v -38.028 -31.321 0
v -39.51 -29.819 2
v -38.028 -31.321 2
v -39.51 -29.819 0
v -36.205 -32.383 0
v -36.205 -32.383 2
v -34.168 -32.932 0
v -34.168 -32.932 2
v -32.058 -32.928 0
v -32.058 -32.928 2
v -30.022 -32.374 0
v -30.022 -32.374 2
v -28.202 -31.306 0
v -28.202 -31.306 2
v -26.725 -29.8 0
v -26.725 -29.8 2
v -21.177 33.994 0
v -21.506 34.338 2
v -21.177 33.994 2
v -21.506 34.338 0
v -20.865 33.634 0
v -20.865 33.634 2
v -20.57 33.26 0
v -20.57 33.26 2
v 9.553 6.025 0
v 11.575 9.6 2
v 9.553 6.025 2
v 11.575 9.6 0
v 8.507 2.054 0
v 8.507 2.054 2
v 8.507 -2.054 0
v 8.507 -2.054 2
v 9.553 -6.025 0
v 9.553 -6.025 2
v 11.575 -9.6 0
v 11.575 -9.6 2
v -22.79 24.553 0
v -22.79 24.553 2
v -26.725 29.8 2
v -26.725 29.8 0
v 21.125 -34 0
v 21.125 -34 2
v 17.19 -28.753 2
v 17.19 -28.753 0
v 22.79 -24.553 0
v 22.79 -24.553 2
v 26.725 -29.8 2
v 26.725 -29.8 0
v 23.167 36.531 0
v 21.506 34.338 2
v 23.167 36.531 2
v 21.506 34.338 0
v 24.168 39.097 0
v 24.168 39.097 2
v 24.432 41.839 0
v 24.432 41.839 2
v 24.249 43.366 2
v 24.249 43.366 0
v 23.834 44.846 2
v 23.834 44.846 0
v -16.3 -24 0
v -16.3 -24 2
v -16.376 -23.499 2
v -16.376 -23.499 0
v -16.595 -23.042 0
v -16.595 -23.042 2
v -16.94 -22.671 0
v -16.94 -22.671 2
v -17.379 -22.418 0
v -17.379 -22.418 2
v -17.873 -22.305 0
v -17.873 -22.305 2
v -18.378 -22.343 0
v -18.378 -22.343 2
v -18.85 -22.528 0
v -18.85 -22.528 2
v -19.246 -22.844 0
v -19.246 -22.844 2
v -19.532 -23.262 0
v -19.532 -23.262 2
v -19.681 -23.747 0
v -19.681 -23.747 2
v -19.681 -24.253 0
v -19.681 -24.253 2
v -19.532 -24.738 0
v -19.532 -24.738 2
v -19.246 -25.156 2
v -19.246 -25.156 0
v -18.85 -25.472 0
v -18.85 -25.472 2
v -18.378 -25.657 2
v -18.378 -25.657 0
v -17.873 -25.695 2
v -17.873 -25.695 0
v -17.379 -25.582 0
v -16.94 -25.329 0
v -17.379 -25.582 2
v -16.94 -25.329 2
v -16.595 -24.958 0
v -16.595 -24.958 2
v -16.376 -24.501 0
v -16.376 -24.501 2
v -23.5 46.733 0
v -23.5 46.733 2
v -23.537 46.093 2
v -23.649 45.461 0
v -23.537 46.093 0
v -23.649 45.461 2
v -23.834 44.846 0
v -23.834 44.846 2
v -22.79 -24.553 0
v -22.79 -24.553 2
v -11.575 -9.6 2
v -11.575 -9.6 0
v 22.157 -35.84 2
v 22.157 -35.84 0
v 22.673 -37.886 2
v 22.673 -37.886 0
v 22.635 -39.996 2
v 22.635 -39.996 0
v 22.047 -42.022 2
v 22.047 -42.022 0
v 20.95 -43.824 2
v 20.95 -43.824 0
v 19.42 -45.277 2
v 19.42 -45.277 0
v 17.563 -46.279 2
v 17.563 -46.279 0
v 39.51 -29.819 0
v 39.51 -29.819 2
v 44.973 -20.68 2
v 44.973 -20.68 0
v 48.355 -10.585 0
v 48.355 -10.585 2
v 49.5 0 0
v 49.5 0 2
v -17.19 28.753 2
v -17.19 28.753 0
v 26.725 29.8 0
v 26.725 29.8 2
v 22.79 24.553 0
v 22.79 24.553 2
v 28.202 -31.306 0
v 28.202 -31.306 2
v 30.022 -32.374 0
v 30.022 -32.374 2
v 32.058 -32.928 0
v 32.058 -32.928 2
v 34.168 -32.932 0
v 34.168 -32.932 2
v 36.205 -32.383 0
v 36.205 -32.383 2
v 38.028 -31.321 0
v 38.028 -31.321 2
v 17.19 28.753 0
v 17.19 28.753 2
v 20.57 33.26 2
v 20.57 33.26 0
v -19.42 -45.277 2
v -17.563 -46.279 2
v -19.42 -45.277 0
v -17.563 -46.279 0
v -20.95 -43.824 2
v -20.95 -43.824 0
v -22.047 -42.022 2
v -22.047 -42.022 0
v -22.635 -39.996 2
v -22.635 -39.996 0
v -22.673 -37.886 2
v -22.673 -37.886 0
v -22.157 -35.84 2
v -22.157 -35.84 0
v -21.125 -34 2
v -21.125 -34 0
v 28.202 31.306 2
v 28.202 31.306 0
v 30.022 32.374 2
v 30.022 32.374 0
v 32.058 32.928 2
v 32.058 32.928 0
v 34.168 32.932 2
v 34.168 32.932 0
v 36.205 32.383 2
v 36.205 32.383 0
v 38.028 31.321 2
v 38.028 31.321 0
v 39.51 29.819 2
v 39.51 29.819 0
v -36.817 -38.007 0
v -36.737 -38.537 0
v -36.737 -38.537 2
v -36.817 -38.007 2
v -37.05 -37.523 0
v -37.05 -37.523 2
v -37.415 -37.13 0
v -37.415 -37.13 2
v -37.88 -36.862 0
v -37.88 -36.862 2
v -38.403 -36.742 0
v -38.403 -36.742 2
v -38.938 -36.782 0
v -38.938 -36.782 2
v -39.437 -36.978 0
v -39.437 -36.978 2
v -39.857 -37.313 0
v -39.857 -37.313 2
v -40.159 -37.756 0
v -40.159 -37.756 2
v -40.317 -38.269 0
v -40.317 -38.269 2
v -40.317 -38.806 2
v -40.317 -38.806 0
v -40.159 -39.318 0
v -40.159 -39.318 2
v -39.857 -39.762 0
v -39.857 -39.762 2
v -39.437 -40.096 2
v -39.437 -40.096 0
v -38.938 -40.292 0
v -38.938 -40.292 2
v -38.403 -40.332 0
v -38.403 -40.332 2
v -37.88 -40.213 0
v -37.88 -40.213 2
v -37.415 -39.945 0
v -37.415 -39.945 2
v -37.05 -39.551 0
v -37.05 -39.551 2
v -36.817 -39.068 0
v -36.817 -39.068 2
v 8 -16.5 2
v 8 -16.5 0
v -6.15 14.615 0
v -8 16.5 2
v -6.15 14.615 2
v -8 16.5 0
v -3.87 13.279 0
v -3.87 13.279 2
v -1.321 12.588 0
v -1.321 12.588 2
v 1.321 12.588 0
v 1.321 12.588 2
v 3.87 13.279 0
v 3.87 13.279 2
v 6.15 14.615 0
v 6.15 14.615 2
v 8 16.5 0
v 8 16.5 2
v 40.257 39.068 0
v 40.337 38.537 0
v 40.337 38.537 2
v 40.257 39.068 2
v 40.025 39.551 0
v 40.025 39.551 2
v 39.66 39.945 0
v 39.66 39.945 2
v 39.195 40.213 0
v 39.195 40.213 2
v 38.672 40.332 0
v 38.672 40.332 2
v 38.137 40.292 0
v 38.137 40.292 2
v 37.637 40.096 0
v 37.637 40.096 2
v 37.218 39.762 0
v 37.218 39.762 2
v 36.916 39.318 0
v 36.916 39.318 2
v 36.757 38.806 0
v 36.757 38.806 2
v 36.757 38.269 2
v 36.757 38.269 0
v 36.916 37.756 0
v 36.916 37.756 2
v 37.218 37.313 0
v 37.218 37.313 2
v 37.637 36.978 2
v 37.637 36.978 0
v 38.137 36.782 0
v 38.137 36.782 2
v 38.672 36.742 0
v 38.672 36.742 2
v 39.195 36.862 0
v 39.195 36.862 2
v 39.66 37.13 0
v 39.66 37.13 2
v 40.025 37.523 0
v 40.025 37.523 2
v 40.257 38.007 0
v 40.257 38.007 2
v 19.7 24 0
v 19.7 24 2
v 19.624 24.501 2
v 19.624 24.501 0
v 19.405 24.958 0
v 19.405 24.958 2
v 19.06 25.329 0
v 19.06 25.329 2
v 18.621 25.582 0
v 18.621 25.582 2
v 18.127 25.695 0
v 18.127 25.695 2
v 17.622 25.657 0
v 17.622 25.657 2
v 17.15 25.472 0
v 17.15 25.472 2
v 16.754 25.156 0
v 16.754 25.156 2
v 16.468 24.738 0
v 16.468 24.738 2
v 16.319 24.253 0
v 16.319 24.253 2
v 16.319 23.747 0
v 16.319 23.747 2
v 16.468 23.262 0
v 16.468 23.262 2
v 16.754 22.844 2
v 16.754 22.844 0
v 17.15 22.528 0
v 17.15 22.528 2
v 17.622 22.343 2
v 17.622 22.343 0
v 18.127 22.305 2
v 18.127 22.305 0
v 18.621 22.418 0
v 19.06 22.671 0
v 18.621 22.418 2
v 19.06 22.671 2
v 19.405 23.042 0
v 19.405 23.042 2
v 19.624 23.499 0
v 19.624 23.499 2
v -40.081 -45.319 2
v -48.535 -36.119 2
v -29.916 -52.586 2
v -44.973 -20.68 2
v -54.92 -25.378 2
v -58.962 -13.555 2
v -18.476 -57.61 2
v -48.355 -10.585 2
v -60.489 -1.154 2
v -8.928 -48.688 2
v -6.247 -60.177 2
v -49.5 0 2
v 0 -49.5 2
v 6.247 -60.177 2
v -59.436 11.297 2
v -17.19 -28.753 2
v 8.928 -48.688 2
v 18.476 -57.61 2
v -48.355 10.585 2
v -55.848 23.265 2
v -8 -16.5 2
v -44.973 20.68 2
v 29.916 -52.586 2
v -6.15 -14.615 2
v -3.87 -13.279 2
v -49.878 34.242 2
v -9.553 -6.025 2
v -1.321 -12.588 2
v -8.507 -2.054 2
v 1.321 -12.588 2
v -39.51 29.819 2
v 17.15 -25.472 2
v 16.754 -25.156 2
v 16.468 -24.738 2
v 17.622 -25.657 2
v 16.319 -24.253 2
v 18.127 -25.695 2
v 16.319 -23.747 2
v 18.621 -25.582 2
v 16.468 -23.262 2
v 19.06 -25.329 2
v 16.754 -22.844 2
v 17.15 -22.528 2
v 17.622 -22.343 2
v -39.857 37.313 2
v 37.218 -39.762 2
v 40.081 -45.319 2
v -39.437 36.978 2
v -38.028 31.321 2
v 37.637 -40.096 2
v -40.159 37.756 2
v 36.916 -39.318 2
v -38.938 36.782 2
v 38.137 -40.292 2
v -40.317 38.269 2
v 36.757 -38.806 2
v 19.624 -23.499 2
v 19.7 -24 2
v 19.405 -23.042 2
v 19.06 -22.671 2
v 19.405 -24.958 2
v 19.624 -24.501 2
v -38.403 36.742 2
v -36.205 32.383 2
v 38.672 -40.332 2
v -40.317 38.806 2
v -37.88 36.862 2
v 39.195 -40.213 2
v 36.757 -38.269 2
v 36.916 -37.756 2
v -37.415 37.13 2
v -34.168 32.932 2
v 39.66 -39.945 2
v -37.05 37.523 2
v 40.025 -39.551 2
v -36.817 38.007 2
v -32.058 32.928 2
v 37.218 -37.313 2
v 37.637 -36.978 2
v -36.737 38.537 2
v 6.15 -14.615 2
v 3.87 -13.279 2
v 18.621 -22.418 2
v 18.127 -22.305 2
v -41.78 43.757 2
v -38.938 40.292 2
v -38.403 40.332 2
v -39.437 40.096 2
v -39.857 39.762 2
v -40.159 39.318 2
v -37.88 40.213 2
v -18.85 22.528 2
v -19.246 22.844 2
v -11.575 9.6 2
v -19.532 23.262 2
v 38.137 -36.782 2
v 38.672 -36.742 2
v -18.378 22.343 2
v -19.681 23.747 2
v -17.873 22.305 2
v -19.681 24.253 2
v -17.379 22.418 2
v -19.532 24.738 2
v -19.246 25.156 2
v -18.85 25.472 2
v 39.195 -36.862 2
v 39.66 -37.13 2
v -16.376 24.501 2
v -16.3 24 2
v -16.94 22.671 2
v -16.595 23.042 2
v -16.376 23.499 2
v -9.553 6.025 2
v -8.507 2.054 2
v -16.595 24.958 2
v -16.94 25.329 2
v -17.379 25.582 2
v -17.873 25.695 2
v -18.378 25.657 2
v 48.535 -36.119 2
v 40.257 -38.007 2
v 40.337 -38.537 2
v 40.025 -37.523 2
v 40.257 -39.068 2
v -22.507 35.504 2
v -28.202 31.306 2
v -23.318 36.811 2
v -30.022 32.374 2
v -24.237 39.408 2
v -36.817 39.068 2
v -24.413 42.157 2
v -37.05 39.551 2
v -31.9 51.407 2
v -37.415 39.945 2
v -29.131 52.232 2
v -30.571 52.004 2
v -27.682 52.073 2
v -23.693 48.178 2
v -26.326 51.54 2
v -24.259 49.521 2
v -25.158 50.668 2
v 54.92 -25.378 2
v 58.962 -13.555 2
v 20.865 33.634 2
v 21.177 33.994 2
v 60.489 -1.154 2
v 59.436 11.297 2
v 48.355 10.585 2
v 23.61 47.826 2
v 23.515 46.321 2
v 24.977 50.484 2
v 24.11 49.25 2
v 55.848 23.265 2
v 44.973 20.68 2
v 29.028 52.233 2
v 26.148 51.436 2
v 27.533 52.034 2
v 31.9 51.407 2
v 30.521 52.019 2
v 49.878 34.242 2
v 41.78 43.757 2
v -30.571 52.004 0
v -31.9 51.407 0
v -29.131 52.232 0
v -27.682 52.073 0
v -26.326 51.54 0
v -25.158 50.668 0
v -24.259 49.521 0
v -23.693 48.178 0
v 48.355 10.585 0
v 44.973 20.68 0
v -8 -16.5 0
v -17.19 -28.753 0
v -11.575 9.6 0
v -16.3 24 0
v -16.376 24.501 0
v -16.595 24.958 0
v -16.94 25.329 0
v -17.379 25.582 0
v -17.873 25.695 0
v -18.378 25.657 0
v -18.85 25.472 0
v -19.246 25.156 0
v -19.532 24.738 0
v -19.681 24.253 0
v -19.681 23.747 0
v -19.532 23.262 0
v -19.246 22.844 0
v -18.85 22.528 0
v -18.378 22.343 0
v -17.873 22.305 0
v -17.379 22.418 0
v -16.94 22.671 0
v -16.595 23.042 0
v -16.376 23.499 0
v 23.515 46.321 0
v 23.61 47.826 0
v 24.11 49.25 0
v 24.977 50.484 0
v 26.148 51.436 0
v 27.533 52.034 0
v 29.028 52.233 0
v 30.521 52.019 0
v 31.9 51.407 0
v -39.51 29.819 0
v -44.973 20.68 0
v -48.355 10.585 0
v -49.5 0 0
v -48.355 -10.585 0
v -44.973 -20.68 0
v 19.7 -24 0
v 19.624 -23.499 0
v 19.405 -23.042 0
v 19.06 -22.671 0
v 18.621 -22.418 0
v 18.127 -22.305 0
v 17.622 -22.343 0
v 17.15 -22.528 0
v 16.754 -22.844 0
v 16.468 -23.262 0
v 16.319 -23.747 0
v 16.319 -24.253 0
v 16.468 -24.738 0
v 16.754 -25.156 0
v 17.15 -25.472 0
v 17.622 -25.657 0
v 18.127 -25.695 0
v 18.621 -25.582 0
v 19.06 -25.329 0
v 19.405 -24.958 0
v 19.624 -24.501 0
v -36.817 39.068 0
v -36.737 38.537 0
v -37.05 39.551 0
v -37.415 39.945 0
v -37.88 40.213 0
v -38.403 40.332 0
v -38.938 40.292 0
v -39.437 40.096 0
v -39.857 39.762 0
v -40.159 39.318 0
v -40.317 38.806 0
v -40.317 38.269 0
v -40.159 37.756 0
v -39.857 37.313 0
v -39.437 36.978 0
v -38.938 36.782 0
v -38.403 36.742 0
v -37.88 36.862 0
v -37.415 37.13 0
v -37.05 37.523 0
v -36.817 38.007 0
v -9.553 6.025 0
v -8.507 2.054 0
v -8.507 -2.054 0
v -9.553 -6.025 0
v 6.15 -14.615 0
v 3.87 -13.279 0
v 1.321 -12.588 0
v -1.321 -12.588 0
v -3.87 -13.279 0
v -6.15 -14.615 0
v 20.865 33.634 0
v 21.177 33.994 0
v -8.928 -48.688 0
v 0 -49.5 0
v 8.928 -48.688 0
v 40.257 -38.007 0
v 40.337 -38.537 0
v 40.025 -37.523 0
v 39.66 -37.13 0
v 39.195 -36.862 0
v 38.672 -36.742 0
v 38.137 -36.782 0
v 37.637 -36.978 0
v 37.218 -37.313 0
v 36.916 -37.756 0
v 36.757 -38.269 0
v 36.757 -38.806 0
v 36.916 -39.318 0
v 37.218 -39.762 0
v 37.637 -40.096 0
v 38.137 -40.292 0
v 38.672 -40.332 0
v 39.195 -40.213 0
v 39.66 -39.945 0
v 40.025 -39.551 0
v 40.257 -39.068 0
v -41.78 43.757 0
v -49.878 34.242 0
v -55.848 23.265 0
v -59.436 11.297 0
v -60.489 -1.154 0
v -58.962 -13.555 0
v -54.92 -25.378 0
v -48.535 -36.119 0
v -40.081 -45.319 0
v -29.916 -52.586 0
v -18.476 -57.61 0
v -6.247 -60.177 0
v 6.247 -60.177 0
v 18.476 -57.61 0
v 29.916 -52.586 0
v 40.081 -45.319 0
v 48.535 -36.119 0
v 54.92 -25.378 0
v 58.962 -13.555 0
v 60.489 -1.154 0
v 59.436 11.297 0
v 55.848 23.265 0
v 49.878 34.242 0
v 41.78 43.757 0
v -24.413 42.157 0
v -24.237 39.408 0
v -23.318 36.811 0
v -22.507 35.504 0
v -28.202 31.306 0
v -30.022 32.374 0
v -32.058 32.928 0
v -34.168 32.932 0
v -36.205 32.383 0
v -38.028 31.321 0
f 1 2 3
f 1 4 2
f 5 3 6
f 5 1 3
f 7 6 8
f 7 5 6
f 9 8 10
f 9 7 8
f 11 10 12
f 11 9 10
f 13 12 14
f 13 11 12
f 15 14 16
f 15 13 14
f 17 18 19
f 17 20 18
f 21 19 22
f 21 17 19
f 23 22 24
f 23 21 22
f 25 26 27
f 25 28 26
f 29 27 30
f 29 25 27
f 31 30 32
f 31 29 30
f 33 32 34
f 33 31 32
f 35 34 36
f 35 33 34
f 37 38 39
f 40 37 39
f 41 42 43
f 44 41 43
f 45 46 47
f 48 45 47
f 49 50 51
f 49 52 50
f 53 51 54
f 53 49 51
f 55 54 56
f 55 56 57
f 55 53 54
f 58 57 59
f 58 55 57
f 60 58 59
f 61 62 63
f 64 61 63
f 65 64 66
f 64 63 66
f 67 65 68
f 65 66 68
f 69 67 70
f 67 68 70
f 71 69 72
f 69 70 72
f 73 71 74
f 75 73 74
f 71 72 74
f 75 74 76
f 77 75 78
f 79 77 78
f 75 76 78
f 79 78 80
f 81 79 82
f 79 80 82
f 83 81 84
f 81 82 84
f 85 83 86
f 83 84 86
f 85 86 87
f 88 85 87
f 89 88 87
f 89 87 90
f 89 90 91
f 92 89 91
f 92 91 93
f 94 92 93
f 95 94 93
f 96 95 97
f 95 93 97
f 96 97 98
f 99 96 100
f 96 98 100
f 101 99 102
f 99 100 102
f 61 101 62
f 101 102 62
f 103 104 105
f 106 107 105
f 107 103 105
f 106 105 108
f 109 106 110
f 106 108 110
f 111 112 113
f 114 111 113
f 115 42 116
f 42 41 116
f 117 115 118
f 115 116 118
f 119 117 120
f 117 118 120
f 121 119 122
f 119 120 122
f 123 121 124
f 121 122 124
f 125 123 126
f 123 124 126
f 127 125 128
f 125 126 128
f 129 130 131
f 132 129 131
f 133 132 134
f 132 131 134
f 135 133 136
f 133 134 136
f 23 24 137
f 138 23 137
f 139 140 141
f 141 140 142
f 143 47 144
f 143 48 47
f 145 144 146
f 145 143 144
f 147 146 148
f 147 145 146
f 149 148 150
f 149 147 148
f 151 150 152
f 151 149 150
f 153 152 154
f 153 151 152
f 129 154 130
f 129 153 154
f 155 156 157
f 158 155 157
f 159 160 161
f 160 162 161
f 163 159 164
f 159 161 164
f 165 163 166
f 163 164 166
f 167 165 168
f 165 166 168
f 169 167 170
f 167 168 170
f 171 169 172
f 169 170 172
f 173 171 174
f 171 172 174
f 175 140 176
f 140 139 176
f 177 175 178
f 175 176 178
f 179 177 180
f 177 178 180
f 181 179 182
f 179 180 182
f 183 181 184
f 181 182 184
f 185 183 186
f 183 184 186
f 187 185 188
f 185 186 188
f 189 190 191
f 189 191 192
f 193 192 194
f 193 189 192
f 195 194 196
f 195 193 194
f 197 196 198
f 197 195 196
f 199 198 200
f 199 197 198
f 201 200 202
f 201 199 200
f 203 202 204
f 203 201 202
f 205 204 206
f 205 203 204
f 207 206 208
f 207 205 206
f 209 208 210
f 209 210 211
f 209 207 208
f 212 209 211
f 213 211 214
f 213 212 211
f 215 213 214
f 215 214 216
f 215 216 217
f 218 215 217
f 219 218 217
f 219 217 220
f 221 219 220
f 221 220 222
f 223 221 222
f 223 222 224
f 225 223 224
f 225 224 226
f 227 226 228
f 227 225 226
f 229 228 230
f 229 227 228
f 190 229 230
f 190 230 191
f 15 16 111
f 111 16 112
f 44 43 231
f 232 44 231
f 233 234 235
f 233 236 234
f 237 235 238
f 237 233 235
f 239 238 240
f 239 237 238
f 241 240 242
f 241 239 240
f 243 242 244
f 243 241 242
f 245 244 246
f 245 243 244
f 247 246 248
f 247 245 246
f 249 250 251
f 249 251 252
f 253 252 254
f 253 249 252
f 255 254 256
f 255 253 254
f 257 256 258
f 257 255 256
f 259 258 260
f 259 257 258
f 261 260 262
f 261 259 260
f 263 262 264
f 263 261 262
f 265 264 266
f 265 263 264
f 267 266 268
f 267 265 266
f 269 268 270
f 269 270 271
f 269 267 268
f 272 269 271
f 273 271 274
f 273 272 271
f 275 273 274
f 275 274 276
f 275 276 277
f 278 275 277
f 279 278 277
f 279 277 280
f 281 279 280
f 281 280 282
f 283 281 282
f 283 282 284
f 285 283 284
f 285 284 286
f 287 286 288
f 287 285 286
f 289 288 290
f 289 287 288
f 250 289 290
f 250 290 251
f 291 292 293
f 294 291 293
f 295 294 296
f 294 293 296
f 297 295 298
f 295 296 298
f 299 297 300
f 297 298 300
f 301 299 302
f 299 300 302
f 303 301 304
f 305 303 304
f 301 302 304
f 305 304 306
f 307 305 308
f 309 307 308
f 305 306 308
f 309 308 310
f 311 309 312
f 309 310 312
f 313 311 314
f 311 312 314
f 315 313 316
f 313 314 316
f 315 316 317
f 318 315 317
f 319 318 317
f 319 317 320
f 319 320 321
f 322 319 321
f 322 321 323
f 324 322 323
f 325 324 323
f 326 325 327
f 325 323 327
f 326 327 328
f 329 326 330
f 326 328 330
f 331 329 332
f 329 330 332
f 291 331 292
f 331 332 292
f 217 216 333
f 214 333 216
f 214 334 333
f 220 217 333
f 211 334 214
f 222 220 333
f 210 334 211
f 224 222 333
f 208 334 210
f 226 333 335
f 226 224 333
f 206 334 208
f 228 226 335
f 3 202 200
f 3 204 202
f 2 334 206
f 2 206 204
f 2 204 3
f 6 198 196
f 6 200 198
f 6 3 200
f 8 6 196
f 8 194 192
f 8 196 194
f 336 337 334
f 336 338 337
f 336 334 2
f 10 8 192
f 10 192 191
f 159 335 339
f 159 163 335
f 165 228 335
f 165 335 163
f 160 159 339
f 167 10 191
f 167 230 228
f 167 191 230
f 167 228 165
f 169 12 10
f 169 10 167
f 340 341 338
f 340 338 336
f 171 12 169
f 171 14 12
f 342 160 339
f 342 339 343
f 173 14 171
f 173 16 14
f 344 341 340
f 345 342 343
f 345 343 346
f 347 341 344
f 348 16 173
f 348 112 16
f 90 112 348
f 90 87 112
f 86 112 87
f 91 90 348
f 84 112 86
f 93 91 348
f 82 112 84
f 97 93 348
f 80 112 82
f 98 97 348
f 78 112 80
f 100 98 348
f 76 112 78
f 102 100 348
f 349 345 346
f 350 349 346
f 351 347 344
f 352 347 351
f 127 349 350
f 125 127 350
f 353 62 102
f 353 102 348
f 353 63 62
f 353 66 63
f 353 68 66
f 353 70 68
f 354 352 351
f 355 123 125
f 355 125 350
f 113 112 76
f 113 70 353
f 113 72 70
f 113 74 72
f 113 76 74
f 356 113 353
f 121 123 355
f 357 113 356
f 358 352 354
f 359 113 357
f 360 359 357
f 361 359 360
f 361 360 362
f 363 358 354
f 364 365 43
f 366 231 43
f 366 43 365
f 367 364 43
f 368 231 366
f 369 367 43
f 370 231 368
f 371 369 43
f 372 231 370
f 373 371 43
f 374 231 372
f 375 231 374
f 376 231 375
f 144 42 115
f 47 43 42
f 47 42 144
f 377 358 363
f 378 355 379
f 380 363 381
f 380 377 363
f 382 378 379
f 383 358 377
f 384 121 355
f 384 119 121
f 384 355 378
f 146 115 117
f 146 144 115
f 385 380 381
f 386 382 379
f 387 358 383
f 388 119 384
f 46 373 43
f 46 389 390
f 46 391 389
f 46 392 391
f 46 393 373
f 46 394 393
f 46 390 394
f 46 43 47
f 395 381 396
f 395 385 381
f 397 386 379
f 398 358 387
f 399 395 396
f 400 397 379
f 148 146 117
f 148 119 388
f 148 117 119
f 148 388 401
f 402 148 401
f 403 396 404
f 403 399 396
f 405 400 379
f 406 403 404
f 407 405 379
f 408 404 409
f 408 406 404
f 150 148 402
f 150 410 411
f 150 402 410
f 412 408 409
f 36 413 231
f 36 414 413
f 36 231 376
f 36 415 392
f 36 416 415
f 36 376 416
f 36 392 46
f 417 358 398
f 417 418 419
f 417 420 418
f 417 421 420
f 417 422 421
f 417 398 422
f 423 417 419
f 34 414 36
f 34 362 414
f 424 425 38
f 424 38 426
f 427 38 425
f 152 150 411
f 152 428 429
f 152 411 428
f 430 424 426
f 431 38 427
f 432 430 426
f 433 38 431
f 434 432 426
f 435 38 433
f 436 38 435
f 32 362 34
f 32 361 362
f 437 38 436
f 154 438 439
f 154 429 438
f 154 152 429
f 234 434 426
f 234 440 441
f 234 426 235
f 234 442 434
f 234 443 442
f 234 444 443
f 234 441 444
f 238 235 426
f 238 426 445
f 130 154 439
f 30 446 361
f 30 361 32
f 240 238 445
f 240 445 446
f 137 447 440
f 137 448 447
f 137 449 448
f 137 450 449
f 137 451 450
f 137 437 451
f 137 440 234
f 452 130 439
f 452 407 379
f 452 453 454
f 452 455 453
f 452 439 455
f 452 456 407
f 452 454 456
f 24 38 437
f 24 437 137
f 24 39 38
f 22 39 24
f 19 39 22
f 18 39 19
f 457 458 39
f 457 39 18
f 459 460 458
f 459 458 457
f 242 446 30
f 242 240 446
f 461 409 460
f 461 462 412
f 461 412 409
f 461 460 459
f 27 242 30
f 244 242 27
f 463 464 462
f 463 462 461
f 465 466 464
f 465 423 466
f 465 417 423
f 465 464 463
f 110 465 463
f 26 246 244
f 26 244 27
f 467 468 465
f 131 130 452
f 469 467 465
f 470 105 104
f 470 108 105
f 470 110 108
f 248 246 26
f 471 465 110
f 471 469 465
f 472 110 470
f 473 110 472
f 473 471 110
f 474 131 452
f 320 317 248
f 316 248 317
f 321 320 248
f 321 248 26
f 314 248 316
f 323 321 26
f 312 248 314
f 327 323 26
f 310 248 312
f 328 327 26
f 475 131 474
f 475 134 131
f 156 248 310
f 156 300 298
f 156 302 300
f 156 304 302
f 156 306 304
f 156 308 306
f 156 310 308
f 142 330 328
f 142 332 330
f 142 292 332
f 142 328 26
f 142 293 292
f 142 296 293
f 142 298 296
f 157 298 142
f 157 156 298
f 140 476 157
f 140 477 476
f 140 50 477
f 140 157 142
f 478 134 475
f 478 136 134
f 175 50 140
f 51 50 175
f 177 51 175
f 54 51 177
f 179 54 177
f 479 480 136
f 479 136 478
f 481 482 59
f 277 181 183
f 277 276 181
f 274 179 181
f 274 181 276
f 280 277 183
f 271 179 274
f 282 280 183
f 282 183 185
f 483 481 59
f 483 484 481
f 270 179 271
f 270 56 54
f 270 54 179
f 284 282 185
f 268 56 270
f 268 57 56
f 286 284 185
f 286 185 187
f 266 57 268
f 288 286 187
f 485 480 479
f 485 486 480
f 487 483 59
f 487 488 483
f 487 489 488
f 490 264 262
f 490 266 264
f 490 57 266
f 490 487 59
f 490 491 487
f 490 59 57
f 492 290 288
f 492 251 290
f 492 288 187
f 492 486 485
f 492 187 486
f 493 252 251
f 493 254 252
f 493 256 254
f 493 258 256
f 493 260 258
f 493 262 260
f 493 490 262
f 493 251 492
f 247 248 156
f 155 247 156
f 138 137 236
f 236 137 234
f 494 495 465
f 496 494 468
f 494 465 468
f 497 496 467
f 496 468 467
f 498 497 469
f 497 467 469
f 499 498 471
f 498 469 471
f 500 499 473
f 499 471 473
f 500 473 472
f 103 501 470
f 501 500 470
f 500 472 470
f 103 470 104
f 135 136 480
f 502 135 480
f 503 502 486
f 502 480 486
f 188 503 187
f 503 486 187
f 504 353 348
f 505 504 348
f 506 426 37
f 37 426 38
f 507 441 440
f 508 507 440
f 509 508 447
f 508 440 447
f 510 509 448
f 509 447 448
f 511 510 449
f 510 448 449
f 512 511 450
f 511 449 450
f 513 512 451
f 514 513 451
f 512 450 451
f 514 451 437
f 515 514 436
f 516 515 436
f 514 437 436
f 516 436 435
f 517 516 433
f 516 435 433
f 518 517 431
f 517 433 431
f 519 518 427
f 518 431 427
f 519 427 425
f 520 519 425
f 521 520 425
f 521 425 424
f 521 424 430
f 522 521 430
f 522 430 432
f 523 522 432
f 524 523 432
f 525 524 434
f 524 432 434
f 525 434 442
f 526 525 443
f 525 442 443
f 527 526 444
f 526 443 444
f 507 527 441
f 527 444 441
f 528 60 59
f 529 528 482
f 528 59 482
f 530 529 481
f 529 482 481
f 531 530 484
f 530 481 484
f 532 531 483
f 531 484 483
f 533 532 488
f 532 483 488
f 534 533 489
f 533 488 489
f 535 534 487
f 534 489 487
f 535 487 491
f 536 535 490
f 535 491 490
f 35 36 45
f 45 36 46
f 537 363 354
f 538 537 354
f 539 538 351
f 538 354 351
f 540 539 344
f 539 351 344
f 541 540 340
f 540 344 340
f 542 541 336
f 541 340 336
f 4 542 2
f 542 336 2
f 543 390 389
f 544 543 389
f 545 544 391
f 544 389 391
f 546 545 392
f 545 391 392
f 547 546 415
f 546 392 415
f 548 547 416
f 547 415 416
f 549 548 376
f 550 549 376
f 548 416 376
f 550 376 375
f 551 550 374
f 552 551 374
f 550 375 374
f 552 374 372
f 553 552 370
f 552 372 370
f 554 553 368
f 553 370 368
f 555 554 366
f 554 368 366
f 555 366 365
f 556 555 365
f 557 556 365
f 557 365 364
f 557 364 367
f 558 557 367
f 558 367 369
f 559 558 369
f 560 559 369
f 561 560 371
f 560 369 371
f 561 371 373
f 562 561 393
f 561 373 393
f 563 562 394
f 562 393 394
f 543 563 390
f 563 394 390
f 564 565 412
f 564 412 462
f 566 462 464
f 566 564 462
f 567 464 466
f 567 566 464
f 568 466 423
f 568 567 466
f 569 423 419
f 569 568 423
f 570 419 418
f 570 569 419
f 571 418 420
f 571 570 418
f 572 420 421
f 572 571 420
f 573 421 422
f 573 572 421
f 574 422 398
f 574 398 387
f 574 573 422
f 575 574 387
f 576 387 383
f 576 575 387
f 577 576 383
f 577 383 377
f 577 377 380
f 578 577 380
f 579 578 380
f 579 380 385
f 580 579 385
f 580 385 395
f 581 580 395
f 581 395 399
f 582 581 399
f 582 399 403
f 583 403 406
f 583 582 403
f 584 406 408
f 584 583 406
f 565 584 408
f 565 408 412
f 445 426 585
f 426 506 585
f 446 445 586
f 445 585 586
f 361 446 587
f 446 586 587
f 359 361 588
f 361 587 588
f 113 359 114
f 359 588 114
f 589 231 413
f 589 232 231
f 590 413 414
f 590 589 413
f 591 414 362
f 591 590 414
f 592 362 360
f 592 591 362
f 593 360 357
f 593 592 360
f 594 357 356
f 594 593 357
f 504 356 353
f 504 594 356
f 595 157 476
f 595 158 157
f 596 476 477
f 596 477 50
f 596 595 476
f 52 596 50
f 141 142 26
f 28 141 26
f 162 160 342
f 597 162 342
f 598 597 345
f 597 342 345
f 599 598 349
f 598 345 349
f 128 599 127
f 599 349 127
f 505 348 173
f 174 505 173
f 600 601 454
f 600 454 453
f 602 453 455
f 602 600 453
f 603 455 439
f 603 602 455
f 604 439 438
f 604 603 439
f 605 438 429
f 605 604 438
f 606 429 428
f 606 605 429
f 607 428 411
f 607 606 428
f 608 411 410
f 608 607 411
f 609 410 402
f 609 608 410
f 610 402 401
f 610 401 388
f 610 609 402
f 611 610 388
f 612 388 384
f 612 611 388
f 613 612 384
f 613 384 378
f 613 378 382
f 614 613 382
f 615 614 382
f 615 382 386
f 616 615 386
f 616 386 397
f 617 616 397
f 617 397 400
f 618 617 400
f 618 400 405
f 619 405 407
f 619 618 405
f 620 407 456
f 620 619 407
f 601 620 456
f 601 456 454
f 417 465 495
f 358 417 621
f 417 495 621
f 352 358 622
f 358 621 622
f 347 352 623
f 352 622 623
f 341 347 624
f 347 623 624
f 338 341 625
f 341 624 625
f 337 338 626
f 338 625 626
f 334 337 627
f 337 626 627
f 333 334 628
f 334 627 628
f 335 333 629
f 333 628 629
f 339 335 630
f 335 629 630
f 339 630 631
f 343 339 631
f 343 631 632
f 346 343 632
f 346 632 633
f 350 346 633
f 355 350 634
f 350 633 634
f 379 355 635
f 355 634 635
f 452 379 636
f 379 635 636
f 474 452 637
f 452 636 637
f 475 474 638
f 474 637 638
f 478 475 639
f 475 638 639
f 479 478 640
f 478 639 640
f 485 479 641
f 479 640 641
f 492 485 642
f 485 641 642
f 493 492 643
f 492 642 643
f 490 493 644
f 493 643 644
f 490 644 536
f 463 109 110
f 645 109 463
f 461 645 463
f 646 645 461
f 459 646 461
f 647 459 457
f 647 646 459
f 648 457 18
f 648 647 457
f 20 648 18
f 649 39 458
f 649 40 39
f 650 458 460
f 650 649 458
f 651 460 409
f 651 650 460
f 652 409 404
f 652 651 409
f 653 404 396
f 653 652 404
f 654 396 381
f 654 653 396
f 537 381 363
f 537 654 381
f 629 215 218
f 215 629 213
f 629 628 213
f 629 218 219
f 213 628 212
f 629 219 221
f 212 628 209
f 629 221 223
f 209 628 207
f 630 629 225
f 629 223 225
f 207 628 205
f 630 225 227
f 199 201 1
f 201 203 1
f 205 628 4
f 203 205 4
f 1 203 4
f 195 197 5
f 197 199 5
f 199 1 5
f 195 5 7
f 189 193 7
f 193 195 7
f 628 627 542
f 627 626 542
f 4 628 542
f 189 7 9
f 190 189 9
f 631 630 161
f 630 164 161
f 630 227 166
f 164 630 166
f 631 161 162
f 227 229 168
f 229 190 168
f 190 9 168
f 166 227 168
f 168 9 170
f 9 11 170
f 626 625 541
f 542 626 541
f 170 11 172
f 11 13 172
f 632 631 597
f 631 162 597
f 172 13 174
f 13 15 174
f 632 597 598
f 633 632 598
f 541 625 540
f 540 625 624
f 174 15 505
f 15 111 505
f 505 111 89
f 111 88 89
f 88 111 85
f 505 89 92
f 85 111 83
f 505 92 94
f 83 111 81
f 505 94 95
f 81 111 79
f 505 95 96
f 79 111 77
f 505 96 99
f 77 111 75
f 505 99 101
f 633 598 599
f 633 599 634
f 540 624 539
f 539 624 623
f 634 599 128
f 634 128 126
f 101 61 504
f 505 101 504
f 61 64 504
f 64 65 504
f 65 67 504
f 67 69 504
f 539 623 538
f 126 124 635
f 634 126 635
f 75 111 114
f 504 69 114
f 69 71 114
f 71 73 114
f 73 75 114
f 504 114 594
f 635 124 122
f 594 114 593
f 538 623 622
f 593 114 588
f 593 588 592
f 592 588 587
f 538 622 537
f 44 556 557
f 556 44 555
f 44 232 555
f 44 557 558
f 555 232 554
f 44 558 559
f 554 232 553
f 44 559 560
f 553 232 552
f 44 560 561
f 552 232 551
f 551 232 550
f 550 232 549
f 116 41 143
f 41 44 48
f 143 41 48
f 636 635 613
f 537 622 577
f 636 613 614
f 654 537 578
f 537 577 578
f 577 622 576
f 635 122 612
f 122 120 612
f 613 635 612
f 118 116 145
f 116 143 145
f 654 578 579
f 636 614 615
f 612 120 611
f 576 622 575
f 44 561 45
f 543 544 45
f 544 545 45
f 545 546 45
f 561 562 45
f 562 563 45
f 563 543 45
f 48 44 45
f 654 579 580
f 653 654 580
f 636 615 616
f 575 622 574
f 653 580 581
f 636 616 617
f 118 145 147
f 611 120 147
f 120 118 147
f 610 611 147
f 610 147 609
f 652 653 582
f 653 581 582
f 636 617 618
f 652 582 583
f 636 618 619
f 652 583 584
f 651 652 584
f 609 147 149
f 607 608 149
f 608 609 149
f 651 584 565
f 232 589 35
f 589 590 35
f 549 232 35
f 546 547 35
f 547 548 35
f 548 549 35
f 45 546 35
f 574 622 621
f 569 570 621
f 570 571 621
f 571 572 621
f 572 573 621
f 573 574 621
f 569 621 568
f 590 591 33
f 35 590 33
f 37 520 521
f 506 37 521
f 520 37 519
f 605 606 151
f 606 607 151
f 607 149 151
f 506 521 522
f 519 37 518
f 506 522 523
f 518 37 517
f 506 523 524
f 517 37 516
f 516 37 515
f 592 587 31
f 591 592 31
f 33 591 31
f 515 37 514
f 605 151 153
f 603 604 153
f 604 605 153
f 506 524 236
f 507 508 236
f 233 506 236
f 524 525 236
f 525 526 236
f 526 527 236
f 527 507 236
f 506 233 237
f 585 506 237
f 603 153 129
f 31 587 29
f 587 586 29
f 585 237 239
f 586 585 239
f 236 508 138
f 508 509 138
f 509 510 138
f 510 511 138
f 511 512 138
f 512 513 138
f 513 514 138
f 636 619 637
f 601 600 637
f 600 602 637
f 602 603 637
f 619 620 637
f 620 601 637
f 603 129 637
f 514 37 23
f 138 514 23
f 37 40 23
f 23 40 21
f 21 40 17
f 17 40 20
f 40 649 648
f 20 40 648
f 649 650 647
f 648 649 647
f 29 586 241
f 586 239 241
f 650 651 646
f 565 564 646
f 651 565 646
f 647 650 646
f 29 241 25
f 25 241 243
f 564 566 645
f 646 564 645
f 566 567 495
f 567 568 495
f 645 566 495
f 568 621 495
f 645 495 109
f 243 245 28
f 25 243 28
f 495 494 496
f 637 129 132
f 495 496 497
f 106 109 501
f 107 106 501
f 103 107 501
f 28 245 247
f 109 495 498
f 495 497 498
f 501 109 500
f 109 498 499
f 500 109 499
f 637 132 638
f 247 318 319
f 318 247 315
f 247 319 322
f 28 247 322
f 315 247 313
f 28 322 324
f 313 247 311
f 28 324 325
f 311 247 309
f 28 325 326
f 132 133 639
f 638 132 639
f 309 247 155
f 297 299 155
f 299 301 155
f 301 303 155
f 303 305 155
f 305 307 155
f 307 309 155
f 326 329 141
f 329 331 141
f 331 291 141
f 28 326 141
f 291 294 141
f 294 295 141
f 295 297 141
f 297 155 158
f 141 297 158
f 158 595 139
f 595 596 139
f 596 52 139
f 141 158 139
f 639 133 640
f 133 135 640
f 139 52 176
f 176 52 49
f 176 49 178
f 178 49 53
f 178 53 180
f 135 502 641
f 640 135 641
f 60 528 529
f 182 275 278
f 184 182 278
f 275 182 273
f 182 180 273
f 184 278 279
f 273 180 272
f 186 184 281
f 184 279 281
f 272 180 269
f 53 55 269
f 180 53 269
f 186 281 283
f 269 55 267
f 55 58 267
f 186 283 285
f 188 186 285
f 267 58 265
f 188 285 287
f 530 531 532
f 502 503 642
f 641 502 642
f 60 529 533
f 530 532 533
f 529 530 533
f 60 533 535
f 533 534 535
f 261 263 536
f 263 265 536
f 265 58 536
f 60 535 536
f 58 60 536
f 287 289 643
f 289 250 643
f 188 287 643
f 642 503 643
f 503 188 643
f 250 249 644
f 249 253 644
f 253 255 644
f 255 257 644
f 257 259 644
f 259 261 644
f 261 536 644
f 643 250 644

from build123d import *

# Parameters (mm, degrees)
SKETCH_1_R          = 60.5
SKETCH_1_R_2        = 1.8
EXTRUDE_1_DEPTH     = 2
SKETCH_2_R          = 1.7
CUT_EXTRUDE_1_DEPTH = 2
FILLET_2_R          = 16
FILLET_3_R          = 10
FILLET_4_R          = 8
FILLET_5_R          = 8
CUT_EXTRUDE_4_DEPTH = 10
FILLET_7_R          = 10
FILLET_8_R          = 10


with BuildPart() as part:
    # 草图1 → 凸台-拉伸1 (new body)
    with BuildSketch(Plane.XY):
        Circle(SKETCH_1_R)
        with Locations((38.537319575, 38.537319575)):
            Circle(SKETCH_1_R_2, mode=Mode.SUBTRACT)
        with Locations((38.537319575, -38.537319575)):
            Circle(SKETCH_1_R_2, mode=Mode.SUBTRACT)
        with Locations((-38.537319575, -38.537319575)):
            Circle(SKETCH_1_R_2, mode=Mode.SUBTRACT)
        with Locations((-38.537319575, 38.537319575)):
            Circle(SKETCH_1_R_2, mode=Mode.SUBTRACT)
    extrude(amount=EXTRUDE_1_DEPTH)

    # 草图2 → 切除-拉伸1 (cut)
    with BuildSketch(Plane.XY.offset(2)):
        with BuildLine():
            Line((-4.375, 0), (-22.789997499, 24.553329998))
            ThreePointArc((-22.789997499, 24.553329998), (-33.5, 0), (-22.789997499, -24.553329998))
            Line((-22.789997499, -24.553329998), (-4.375, 0))
        make_face()
        with BuildLine():
            Line((-22.789997499, 24.553329998), (-32.42566455, 37.400886066))
            ThreePointArc((-32.42566455, 37.400886066), (-49.5, 0), (-32.42566455, -37.400886066))
            Line((-32.42566455, -37.400886066), (-22.789997499, -24.553329998))
            ThreePointArc((-22.789997499, -24.553329998), (-33.5, 0), (-22.789997499, 24.553329998))
        make_face()
        with BuildLine():
            Line((17.189997499, 28.753329998), (26.82566455, 41.600886066))
            ThreePointArc((26.82566455, 41.600886066), (0, 49.5), (-26.82566455, 41.600886066))
            Line((-26.82566455, 41.600886066), (-17.189997499, 28.753329998))
            ThreePointArc((-17.189997499, 28.753329998), (0, 33.5), (17.189997499, 28.753329998))
        make_face()
        with BuildLine():
            Line((0, 5.833333333), (17.189997499, 28.753329998))
            ThreePointArc((17.189997499, 28.753329998), (0, 33.5), (-17.189997499, 28.753329998))
            Line((-17.189997499, 28.753329998), (0, 5.833333333))
        make_face()
        with BuildLine():
            ThreePointArc((49.5, 0), (45.02954805, 20.556989138), (32.42566455, 37.400886066))
            Line((32.42566455, 37.400886066), (22.789997499, 24.553329998))
            ThreePointArc((22.789997499, 24.553329998), (30.705984076, 13.393750106), (33.5, 0))
            ThreePointArc((33.5, 0), (30.705984076, -13.393750106), (22.789997499, -24.553329998))
            Line((22.789997499, -24.553329998), (32.42566455, -37.400886066))
            ThreePointArc((32.42566455, -37.400886066), (45.02954805, -20.556989138), (49.5, 0))
        make_face()
        with BuildLine():
            ThreePointArc((33.5, 0), (30.705984076, 13.393750106), (22.789997499, 24.553329998))
            Line((22.789997499, 24.553329998), (4.375, 0))
            Line((4.375, 0), (22.789997499, -24.553329998))
            ThreePointArc((22.789997499, -24.553329998), (30.705984076, -13.393750106), (33.5, 0))
        make_face()
        with BuildLine():
            ThreePointArc((-26.82566455, -41.600886066), (0, -49.5), (26.82566455, -41.600886066))
            Line((26.82566455, -41.600886066), (17.189997499, -28.753329998))
            ThreePointArc((17.189997499, -28.753329998), (0, -33.5), (-17.189997499, -28.753329998))
            Line((-17.189997499, -28.753329998), (-26.82566455, -41.600886066))
        make_face()
        with BuildLine():
            ThreePointArc((-17.189997499, -28.753329998), (0, -33.5), (17.189997499, -28.753329998))
            Line((17.189997499, -28.753329998), (0, -5.833333333))
            Line((0, -5.833333333), (-17.189997499, -28.753329998))
        make_face()
        with Locations((18, 24)):
            Circle(SKETCH_2_R)
        with Locations((-18, 24)):
            Circle(SKETCH_2_R)
        with Locations((-18, -24)):
            Circle(SKETCH_2_R)
        with Locations((18, -24)):
            Circle(SKETCH_2_R)
    extrude(amount=-CUT_EXTRUDE_1_DEPTH, mode=Mode.SUBTRACT)

    # 圆角2
    fillet_2_edges = [part.edges().sort_by_distance(p)[0] for p in [
        (4.375, 0, 1),
        (-4.375, 0, 1),
    ]]
    fillet(fillet_2_edges, radius=FILLET_2_R)

    # 圆角3
    fillet_3_edges = [part.edges().sort_by_distance(p)[0] for p in [
        (0, -5.833333333, 1),
        (0, 5.833333333, 1),
    ]]
    fillet(fillet_3_edges, radius=FILLET_3_R)

    # 圆角4
    fillet_4_edges = [part.edges().sort_by_distance(p)[0] for p in [
        (26.82566455, -41.600886066, 1),
        (-26.82566455, -41.600886066, 1),
        (-26.82566455, 41.600886066, 1),
        (26.82566455, 41.600886066, 1),
    ]]
    fillet(fillet_4_edges, radius=FILLET_4_R)

    # 圆角5
    fillet_5_edges = [part.edges().sort_by_distance(p)[0] for p in [
        (32.42566455, 37.400886066, 1),
        (32.42566455, -37.400886066, 1),
        (-32.42566455, 37.400886066, 1),
        (-32.42566455, -37.400886066, 1),
    ]]
    fillet(fillet_5_edges, radius=FILLET_5_R)

    # 草图3 → 切除-拉伸4 (cut)
    with BuildSketch(Plane.XY.offset(2)):
        with BuildLine():
            ThreePointArc((-21.124882445, 33.99984326), (-22.40824576, 41.02827952), (-17.563414, 46.279331117))
            ThreePointArc((-17.563414, 46.279331117), (-21.933404034, 44.375396195), (-26.100000126, 42.059957126))
            ThreePointArc((-26.100000126, 42.059957126), (-27.216559114, 41.346207927), (-28.313611465, 40.602825096))
            Line((-28.313611465, 40.602825096), (-21.124882445, 33.99984326))
        make_face()
        with BuildLine():
            ThreePointArc((-17.563414, 46.279331117), (-8.928132775, 48.688175619), (0, 49.5))
            Line((0, 49.5), (0, 60.5))
            ThreePointArc((0, 60.5), (-16.58538253, 58.182257487), (-31.899999898, 51.406614424))
            ThreePointArc((-31.899999898, 51.406614424), (-26.326051556, 51.539531689), (-23.5, 46.733285782))
            ThreePointArc((-23.5, 46.733285782), (-24.1937541, 44.059337326), (-26.100000126, 42.059957126))
            ThreePointArc((-26.100000126, 42.059957126), (-21.933404034, 44.375396195), (-17.563414, 46.279331117))
        make_face()
        with BuildLine():
            Line((0, 60.5), (0, 49.5))
            ThreePointArc((0, 49.5), (8.928132775, 48.688175619), (17.563414, 46.279331117))
            ThreePointArc((17.563414, 46.279331117), (21.933403961, 44.375396231), (26.099999987, 42.059957212))
            ThreePointArc((26.099999987, 42.059957212), (24.32667146, 49.633285844), (31.900000111, 51.406614291))
            ThreePointArc((31.900000111, 51.406614291), (16.585382651, 58.182257453), (0, 60.5))
        make_face()
        with BuildLine():
            ThreePointArc((26.099999987, 42.059957212), (21.933403961, 44.375396231), (17.563414, 46.279331117))
            ThreePointArc((17.563414, 46.279331117), (22.40824576, 41.02827952), (21.124882445, 33.99984326))
            Line((21.124882445, 33.99984326), (28.313611465, 40.602825096))
            ThreePointArc((28.313611465, 40.602825096), (27.216559046, 41.346207972), (26.099999987, 42.059957212))
        make_face()
    extrude(amount=-CUT_EXTRUDE_4_DEPTH, mode=Mode.SUBTRACT)

    # 圆角7
    fillet_7_edges = [part.edges().sort_by_distance(p)[0] for p in [
        (21.124882445, 33.99984326, 1),
        (-21.124882445, 33.99984326, 1),
    ]]
    fillet(fillet_7_edges, radius=FILLET_7_R)

    # 圆角8
    fillet_8_edges = [part.edges().sort_by_distance(p)[0] for p in [
        (28.313611465, 40.602825096, 1),
        (-28.313611465, 40.602825096, 1),
    ]]
    fillet(fillet_8_edges, radius=FILLET_8_R)


solid = part.part
